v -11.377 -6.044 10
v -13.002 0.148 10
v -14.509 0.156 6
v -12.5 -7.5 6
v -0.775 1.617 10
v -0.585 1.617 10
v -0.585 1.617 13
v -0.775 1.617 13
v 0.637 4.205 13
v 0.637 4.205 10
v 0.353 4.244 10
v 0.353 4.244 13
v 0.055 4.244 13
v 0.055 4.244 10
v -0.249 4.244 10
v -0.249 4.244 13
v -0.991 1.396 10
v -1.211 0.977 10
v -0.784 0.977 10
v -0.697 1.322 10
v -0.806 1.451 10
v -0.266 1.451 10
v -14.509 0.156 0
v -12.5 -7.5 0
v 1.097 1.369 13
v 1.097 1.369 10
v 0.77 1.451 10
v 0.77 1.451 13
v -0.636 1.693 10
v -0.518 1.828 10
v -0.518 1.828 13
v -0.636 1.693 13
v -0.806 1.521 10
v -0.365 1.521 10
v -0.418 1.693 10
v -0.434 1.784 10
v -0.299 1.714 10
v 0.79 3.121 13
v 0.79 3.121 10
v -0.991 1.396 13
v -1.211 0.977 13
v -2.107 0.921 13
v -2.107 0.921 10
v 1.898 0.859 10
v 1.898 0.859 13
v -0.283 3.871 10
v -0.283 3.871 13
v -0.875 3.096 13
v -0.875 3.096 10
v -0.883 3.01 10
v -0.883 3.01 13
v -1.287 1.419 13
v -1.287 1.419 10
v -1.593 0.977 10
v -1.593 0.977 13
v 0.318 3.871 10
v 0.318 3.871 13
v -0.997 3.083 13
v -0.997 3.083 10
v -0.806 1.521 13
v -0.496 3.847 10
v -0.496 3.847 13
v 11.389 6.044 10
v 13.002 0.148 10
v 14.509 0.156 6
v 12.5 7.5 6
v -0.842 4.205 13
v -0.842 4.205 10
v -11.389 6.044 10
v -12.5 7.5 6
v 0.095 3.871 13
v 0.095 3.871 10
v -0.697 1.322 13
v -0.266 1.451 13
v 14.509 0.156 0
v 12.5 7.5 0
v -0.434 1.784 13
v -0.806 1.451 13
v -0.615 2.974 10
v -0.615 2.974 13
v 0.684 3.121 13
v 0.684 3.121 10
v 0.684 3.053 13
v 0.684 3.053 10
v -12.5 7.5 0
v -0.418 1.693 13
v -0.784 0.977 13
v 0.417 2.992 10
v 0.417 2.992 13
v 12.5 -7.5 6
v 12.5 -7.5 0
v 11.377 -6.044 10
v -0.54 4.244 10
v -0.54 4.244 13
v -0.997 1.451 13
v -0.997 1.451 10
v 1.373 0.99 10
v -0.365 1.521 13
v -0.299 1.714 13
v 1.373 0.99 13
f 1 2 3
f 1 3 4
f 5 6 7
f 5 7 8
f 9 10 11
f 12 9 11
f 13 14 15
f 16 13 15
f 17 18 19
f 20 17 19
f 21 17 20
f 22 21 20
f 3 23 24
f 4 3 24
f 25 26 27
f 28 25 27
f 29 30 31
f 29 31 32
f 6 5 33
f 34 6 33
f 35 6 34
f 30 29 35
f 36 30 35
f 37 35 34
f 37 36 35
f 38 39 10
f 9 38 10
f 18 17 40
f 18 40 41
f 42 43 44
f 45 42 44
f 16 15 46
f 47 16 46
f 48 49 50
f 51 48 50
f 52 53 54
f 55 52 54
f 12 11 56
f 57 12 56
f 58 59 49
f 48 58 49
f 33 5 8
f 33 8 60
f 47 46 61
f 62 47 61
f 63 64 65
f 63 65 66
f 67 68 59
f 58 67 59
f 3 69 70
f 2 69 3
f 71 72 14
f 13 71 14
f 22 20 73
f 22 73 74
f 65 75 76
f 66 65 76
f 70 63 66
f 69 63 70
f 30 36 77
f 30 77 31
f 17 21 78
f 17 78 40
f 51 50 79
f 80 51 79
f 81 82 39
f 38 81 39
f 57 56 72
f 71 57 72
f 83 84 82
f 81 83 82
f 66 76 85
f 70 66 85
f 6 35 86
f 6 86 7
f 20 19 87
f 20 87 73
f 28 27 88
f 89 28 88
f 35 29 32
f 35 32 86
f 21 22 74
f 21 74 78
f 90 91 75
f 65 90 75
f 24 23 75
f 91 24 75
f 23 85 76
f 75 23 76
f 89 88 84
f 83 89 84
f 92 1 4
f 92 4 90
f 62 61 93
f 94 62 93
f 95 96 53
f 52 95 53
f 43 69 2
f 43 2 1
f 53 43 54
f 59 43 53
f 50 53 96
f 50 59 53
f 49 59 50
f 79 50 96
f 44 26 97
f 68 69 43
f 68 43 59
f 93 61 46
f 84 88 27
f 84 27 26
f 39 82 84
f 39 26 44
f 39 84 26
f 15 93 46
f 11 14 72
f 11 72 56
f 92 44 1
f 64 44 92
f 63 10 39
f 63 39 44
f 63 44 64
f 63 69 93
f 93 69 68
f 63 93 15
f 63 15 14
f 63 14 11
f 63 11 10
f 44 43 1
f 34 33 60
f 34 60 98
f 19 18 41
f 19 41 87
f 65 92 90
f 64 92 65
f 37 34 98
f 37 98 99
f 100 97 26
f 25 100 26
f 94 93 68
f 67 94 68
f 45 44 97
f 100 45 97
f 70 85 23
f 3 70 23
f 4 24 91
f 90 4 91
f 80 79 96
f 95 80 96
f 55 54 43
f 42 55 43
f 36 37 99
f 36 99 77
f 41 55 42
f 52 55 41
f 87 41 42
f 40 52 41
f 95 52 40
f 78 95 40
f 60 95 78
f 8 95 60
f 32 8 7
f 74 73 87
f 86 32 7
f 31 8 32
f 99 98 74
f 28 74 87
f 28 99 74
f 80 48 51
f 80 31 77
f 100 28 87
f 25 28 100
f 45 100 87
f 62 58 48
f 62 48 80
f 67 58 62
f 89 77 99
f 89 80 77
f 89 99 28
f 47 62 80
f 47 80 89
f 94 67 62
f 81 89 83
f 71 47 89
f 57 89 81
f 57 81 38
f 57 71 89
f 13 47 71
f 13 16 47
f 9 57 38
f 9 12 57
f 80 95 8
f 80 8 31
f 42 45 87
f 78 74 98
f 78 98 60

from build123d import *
from OCP.BRepFilletAPI import BRepFilletAPI_MakeChamfer

# Parameters (mm, degrees)
EXTRUDE_1_DEPTH = 10
CHAMFER_4_SIZE  = 4
CHAMFER_4_SIZE2 = 1.455880937
EXTRUDE_2_DEPTH = 3


with BuildPart() as part:
    # 草图1 → 凸台-拉伸1 (new body)
    with BuildSketch(Plane.XY):
        Polygon((-12.5, 7.5), (-14.508805155, 0.156246539), (-12.5, -7.5), (12.5, -7.5), (14.508805155, 0.156246539), (12.5, 7.5), align=None)
    extrude(amount=EXTRUDE_1_DEPTH)

    # 倒角4: one chamfer whose edges measure the first distance from different faces: ONE call of the kernel's chamfer builder (chamfer() names one face for all edges)
    chamfer_4_edges_1 = [part.edges().sort_by_distance(p)[0] for p in [
        (-13.504402578, 3.82812327, 10),
    ]]
    chamfer_4_side_1 = [part.faces().sort_by_distance(p)[0] for p in [
        (-13.504402578, 3.82812327, 5),
    ]]
    chamfer_4_edges_2 = [part.edges().sort_by_distance(p)[0] for p in [
        (-13.504402578, -3.67187673, 10),
    ]]
    chamfer_4_side_2 = [part.faces().sort_by_distance(p)[0] for p in [
        (-13.504402578, -3.67187673, 5),
    ]]
    chamfer_4_edges_3 = [part.edges().sort_by_distance(p)[0] for p in [
        (0, -7.5, 10),
    ]]
    chamfer_4_side_3 = [part.faces().sort_by_distance(p)[0] for p in [
        (0, -7.5, 5),
    ]]
    chamfer_4_edges_4 = [part.edges().sort_by_distance(p)[0] for p in [
        (13.504402578, -3.67187673, 10),
    ]]
    chamfer_4_side_4 = [part.faces().sort_by_distance(p)[0] for p in [
        (13.504402578, -3.67187673, 5),
    ]]
    chamfer_4_edges_5 = [part.edges().sort_by_distance(p)[0] for p in [
        (13.504402578, 3.82812327, 10),
    ]]
    chamfer_4_side_5 = [part.faces().sort_by_distance(p)[0] for p in [
        (13.504402578, 3.82812327, 5),
    ]]
    chamfer_4_edges_6 = [part.edges().sort_by_distance(p)[0] for p in [
        (0, 7.5, 10),
    ]]
    chamfer_4_side_6 = [part.faces().sort_by_distance(p)[0] for p in [
        (0, 7.5, 5),
    ]]
    chamfer_4 = BRepFilletAPI_MakeChamfer(part.part.solid().wrapped)
    for e in chamfer_4_edges_1:
        chamfer_4.Add(CHAMFER_4_SIZE, CHAMFER_4_SIZE2, e.wrapped, chamfer_4_side_1[0].wrapped)  # the first distance lies on this face
    for e in chamfer_4_edges_2:
        chamfer_4.Add(CHAMFER_4_SIZE, CHAMFER_4_SIZE2, e.wrapped, chamfer_4_side_2[0].wrapped)  # the first distance lies on this face
    for e in chamfer_4_edges_3:
        chamfer_4.Add(CHAMFER_4_SIZE, CHAMFER_4_SIZE2, e.wrapped, chamfer_4_side_3[0].wrapped)  # the first distance lies on this face
    for e in chamfer_4_edges_4:
        chamfer_4.Add(CHAMFER_4_SIZE, CHAMFER_4_SIZE2, e.wrapped, chamfer_4_side_4[0].wrapped)  # the first distance lies on this face
    for e in chamfer_4_edges_5:
        chamfer_4.Add(CHAMFER_4_SIZE, CHAMFER_4_SIZE2, e.wrapped, chamfer_4_side_5[0].wrapped)  # the first distance lies on this face
    for e in chamfer_4_edges_6:
        chamfer_4.Add(CHAMFER_4_SIZE, CHAMFER_4_SIZE2, e.wrapped, chamfer_4_side_6[0].wrapped)  # the first distance lies on this face
    add(Compound.cast(chamfer_4.Shape()), mode=Mode.REPLACE)

    # 草图4 → 凸台-拉伸2 (add)
    with BuildSketch(Plane.XY.offset(10)):
        Polygon((-0.842329886, 4.204878172), (-0.997111855, 3.082708897), (-0.875425349, 3.0960765), (-0.88342019, 3.010417485), (-0.615021943, 2.973869638), (-0.997111855, 1.451293683), (-1.286540896, 1.419499093), (-1.593044591, 0.977341926), (-2.107271415, 0.920852672), (1.898363481, 0.85858655), (1.373153369, 0.990387846), (1.096764689, 1.369234669), (0.769770761, 1.451293683), (0.417287548, 2.992143562), (0.684395911, 3.053246992), (0.684395911, 3.120908441), (0.790079324, 3.120908441), (0.637139108, 4.204878172), (0.353273229, 4.243532249), (0.31846389, 3.870575043), (0.095475844, 3.870575043), (0.054505452, 4.243532249), (-0.248639641, 4.243532249), (-0.28344898, 3.870575043), (-0.496098331, 3.847214918), (-0.539634898, 4.243532249), align=None)
        Polygon((-1.210689891, 0.977341926), (-0.783853716, 0.977341926), (-0.697469796, 1.321570013), (-0.266044311, 1.451293683), (-0.806066899, 1.451293683), (-0.991003184, 1.395685902), align=None, mode=Mode.SUBTRACT)
        Polygon((-0.806066899, 1.521254444), (-0.364830167, 1.521254444), (-0.29903642, 1.713574629), (-0.43352874, 1.784201139), (-0.517866614, 1.828489836), (-0.635596744, 1.693330399), (-0.417971271, 1.693330399), (-0.585448533, 1.617414536), (-0.774567684, 1.617414536), align=None, mode=Mode.SUBTRACT)
    extrude(amount=EXTRUDE_2_DEPTH)


solid = part.part
